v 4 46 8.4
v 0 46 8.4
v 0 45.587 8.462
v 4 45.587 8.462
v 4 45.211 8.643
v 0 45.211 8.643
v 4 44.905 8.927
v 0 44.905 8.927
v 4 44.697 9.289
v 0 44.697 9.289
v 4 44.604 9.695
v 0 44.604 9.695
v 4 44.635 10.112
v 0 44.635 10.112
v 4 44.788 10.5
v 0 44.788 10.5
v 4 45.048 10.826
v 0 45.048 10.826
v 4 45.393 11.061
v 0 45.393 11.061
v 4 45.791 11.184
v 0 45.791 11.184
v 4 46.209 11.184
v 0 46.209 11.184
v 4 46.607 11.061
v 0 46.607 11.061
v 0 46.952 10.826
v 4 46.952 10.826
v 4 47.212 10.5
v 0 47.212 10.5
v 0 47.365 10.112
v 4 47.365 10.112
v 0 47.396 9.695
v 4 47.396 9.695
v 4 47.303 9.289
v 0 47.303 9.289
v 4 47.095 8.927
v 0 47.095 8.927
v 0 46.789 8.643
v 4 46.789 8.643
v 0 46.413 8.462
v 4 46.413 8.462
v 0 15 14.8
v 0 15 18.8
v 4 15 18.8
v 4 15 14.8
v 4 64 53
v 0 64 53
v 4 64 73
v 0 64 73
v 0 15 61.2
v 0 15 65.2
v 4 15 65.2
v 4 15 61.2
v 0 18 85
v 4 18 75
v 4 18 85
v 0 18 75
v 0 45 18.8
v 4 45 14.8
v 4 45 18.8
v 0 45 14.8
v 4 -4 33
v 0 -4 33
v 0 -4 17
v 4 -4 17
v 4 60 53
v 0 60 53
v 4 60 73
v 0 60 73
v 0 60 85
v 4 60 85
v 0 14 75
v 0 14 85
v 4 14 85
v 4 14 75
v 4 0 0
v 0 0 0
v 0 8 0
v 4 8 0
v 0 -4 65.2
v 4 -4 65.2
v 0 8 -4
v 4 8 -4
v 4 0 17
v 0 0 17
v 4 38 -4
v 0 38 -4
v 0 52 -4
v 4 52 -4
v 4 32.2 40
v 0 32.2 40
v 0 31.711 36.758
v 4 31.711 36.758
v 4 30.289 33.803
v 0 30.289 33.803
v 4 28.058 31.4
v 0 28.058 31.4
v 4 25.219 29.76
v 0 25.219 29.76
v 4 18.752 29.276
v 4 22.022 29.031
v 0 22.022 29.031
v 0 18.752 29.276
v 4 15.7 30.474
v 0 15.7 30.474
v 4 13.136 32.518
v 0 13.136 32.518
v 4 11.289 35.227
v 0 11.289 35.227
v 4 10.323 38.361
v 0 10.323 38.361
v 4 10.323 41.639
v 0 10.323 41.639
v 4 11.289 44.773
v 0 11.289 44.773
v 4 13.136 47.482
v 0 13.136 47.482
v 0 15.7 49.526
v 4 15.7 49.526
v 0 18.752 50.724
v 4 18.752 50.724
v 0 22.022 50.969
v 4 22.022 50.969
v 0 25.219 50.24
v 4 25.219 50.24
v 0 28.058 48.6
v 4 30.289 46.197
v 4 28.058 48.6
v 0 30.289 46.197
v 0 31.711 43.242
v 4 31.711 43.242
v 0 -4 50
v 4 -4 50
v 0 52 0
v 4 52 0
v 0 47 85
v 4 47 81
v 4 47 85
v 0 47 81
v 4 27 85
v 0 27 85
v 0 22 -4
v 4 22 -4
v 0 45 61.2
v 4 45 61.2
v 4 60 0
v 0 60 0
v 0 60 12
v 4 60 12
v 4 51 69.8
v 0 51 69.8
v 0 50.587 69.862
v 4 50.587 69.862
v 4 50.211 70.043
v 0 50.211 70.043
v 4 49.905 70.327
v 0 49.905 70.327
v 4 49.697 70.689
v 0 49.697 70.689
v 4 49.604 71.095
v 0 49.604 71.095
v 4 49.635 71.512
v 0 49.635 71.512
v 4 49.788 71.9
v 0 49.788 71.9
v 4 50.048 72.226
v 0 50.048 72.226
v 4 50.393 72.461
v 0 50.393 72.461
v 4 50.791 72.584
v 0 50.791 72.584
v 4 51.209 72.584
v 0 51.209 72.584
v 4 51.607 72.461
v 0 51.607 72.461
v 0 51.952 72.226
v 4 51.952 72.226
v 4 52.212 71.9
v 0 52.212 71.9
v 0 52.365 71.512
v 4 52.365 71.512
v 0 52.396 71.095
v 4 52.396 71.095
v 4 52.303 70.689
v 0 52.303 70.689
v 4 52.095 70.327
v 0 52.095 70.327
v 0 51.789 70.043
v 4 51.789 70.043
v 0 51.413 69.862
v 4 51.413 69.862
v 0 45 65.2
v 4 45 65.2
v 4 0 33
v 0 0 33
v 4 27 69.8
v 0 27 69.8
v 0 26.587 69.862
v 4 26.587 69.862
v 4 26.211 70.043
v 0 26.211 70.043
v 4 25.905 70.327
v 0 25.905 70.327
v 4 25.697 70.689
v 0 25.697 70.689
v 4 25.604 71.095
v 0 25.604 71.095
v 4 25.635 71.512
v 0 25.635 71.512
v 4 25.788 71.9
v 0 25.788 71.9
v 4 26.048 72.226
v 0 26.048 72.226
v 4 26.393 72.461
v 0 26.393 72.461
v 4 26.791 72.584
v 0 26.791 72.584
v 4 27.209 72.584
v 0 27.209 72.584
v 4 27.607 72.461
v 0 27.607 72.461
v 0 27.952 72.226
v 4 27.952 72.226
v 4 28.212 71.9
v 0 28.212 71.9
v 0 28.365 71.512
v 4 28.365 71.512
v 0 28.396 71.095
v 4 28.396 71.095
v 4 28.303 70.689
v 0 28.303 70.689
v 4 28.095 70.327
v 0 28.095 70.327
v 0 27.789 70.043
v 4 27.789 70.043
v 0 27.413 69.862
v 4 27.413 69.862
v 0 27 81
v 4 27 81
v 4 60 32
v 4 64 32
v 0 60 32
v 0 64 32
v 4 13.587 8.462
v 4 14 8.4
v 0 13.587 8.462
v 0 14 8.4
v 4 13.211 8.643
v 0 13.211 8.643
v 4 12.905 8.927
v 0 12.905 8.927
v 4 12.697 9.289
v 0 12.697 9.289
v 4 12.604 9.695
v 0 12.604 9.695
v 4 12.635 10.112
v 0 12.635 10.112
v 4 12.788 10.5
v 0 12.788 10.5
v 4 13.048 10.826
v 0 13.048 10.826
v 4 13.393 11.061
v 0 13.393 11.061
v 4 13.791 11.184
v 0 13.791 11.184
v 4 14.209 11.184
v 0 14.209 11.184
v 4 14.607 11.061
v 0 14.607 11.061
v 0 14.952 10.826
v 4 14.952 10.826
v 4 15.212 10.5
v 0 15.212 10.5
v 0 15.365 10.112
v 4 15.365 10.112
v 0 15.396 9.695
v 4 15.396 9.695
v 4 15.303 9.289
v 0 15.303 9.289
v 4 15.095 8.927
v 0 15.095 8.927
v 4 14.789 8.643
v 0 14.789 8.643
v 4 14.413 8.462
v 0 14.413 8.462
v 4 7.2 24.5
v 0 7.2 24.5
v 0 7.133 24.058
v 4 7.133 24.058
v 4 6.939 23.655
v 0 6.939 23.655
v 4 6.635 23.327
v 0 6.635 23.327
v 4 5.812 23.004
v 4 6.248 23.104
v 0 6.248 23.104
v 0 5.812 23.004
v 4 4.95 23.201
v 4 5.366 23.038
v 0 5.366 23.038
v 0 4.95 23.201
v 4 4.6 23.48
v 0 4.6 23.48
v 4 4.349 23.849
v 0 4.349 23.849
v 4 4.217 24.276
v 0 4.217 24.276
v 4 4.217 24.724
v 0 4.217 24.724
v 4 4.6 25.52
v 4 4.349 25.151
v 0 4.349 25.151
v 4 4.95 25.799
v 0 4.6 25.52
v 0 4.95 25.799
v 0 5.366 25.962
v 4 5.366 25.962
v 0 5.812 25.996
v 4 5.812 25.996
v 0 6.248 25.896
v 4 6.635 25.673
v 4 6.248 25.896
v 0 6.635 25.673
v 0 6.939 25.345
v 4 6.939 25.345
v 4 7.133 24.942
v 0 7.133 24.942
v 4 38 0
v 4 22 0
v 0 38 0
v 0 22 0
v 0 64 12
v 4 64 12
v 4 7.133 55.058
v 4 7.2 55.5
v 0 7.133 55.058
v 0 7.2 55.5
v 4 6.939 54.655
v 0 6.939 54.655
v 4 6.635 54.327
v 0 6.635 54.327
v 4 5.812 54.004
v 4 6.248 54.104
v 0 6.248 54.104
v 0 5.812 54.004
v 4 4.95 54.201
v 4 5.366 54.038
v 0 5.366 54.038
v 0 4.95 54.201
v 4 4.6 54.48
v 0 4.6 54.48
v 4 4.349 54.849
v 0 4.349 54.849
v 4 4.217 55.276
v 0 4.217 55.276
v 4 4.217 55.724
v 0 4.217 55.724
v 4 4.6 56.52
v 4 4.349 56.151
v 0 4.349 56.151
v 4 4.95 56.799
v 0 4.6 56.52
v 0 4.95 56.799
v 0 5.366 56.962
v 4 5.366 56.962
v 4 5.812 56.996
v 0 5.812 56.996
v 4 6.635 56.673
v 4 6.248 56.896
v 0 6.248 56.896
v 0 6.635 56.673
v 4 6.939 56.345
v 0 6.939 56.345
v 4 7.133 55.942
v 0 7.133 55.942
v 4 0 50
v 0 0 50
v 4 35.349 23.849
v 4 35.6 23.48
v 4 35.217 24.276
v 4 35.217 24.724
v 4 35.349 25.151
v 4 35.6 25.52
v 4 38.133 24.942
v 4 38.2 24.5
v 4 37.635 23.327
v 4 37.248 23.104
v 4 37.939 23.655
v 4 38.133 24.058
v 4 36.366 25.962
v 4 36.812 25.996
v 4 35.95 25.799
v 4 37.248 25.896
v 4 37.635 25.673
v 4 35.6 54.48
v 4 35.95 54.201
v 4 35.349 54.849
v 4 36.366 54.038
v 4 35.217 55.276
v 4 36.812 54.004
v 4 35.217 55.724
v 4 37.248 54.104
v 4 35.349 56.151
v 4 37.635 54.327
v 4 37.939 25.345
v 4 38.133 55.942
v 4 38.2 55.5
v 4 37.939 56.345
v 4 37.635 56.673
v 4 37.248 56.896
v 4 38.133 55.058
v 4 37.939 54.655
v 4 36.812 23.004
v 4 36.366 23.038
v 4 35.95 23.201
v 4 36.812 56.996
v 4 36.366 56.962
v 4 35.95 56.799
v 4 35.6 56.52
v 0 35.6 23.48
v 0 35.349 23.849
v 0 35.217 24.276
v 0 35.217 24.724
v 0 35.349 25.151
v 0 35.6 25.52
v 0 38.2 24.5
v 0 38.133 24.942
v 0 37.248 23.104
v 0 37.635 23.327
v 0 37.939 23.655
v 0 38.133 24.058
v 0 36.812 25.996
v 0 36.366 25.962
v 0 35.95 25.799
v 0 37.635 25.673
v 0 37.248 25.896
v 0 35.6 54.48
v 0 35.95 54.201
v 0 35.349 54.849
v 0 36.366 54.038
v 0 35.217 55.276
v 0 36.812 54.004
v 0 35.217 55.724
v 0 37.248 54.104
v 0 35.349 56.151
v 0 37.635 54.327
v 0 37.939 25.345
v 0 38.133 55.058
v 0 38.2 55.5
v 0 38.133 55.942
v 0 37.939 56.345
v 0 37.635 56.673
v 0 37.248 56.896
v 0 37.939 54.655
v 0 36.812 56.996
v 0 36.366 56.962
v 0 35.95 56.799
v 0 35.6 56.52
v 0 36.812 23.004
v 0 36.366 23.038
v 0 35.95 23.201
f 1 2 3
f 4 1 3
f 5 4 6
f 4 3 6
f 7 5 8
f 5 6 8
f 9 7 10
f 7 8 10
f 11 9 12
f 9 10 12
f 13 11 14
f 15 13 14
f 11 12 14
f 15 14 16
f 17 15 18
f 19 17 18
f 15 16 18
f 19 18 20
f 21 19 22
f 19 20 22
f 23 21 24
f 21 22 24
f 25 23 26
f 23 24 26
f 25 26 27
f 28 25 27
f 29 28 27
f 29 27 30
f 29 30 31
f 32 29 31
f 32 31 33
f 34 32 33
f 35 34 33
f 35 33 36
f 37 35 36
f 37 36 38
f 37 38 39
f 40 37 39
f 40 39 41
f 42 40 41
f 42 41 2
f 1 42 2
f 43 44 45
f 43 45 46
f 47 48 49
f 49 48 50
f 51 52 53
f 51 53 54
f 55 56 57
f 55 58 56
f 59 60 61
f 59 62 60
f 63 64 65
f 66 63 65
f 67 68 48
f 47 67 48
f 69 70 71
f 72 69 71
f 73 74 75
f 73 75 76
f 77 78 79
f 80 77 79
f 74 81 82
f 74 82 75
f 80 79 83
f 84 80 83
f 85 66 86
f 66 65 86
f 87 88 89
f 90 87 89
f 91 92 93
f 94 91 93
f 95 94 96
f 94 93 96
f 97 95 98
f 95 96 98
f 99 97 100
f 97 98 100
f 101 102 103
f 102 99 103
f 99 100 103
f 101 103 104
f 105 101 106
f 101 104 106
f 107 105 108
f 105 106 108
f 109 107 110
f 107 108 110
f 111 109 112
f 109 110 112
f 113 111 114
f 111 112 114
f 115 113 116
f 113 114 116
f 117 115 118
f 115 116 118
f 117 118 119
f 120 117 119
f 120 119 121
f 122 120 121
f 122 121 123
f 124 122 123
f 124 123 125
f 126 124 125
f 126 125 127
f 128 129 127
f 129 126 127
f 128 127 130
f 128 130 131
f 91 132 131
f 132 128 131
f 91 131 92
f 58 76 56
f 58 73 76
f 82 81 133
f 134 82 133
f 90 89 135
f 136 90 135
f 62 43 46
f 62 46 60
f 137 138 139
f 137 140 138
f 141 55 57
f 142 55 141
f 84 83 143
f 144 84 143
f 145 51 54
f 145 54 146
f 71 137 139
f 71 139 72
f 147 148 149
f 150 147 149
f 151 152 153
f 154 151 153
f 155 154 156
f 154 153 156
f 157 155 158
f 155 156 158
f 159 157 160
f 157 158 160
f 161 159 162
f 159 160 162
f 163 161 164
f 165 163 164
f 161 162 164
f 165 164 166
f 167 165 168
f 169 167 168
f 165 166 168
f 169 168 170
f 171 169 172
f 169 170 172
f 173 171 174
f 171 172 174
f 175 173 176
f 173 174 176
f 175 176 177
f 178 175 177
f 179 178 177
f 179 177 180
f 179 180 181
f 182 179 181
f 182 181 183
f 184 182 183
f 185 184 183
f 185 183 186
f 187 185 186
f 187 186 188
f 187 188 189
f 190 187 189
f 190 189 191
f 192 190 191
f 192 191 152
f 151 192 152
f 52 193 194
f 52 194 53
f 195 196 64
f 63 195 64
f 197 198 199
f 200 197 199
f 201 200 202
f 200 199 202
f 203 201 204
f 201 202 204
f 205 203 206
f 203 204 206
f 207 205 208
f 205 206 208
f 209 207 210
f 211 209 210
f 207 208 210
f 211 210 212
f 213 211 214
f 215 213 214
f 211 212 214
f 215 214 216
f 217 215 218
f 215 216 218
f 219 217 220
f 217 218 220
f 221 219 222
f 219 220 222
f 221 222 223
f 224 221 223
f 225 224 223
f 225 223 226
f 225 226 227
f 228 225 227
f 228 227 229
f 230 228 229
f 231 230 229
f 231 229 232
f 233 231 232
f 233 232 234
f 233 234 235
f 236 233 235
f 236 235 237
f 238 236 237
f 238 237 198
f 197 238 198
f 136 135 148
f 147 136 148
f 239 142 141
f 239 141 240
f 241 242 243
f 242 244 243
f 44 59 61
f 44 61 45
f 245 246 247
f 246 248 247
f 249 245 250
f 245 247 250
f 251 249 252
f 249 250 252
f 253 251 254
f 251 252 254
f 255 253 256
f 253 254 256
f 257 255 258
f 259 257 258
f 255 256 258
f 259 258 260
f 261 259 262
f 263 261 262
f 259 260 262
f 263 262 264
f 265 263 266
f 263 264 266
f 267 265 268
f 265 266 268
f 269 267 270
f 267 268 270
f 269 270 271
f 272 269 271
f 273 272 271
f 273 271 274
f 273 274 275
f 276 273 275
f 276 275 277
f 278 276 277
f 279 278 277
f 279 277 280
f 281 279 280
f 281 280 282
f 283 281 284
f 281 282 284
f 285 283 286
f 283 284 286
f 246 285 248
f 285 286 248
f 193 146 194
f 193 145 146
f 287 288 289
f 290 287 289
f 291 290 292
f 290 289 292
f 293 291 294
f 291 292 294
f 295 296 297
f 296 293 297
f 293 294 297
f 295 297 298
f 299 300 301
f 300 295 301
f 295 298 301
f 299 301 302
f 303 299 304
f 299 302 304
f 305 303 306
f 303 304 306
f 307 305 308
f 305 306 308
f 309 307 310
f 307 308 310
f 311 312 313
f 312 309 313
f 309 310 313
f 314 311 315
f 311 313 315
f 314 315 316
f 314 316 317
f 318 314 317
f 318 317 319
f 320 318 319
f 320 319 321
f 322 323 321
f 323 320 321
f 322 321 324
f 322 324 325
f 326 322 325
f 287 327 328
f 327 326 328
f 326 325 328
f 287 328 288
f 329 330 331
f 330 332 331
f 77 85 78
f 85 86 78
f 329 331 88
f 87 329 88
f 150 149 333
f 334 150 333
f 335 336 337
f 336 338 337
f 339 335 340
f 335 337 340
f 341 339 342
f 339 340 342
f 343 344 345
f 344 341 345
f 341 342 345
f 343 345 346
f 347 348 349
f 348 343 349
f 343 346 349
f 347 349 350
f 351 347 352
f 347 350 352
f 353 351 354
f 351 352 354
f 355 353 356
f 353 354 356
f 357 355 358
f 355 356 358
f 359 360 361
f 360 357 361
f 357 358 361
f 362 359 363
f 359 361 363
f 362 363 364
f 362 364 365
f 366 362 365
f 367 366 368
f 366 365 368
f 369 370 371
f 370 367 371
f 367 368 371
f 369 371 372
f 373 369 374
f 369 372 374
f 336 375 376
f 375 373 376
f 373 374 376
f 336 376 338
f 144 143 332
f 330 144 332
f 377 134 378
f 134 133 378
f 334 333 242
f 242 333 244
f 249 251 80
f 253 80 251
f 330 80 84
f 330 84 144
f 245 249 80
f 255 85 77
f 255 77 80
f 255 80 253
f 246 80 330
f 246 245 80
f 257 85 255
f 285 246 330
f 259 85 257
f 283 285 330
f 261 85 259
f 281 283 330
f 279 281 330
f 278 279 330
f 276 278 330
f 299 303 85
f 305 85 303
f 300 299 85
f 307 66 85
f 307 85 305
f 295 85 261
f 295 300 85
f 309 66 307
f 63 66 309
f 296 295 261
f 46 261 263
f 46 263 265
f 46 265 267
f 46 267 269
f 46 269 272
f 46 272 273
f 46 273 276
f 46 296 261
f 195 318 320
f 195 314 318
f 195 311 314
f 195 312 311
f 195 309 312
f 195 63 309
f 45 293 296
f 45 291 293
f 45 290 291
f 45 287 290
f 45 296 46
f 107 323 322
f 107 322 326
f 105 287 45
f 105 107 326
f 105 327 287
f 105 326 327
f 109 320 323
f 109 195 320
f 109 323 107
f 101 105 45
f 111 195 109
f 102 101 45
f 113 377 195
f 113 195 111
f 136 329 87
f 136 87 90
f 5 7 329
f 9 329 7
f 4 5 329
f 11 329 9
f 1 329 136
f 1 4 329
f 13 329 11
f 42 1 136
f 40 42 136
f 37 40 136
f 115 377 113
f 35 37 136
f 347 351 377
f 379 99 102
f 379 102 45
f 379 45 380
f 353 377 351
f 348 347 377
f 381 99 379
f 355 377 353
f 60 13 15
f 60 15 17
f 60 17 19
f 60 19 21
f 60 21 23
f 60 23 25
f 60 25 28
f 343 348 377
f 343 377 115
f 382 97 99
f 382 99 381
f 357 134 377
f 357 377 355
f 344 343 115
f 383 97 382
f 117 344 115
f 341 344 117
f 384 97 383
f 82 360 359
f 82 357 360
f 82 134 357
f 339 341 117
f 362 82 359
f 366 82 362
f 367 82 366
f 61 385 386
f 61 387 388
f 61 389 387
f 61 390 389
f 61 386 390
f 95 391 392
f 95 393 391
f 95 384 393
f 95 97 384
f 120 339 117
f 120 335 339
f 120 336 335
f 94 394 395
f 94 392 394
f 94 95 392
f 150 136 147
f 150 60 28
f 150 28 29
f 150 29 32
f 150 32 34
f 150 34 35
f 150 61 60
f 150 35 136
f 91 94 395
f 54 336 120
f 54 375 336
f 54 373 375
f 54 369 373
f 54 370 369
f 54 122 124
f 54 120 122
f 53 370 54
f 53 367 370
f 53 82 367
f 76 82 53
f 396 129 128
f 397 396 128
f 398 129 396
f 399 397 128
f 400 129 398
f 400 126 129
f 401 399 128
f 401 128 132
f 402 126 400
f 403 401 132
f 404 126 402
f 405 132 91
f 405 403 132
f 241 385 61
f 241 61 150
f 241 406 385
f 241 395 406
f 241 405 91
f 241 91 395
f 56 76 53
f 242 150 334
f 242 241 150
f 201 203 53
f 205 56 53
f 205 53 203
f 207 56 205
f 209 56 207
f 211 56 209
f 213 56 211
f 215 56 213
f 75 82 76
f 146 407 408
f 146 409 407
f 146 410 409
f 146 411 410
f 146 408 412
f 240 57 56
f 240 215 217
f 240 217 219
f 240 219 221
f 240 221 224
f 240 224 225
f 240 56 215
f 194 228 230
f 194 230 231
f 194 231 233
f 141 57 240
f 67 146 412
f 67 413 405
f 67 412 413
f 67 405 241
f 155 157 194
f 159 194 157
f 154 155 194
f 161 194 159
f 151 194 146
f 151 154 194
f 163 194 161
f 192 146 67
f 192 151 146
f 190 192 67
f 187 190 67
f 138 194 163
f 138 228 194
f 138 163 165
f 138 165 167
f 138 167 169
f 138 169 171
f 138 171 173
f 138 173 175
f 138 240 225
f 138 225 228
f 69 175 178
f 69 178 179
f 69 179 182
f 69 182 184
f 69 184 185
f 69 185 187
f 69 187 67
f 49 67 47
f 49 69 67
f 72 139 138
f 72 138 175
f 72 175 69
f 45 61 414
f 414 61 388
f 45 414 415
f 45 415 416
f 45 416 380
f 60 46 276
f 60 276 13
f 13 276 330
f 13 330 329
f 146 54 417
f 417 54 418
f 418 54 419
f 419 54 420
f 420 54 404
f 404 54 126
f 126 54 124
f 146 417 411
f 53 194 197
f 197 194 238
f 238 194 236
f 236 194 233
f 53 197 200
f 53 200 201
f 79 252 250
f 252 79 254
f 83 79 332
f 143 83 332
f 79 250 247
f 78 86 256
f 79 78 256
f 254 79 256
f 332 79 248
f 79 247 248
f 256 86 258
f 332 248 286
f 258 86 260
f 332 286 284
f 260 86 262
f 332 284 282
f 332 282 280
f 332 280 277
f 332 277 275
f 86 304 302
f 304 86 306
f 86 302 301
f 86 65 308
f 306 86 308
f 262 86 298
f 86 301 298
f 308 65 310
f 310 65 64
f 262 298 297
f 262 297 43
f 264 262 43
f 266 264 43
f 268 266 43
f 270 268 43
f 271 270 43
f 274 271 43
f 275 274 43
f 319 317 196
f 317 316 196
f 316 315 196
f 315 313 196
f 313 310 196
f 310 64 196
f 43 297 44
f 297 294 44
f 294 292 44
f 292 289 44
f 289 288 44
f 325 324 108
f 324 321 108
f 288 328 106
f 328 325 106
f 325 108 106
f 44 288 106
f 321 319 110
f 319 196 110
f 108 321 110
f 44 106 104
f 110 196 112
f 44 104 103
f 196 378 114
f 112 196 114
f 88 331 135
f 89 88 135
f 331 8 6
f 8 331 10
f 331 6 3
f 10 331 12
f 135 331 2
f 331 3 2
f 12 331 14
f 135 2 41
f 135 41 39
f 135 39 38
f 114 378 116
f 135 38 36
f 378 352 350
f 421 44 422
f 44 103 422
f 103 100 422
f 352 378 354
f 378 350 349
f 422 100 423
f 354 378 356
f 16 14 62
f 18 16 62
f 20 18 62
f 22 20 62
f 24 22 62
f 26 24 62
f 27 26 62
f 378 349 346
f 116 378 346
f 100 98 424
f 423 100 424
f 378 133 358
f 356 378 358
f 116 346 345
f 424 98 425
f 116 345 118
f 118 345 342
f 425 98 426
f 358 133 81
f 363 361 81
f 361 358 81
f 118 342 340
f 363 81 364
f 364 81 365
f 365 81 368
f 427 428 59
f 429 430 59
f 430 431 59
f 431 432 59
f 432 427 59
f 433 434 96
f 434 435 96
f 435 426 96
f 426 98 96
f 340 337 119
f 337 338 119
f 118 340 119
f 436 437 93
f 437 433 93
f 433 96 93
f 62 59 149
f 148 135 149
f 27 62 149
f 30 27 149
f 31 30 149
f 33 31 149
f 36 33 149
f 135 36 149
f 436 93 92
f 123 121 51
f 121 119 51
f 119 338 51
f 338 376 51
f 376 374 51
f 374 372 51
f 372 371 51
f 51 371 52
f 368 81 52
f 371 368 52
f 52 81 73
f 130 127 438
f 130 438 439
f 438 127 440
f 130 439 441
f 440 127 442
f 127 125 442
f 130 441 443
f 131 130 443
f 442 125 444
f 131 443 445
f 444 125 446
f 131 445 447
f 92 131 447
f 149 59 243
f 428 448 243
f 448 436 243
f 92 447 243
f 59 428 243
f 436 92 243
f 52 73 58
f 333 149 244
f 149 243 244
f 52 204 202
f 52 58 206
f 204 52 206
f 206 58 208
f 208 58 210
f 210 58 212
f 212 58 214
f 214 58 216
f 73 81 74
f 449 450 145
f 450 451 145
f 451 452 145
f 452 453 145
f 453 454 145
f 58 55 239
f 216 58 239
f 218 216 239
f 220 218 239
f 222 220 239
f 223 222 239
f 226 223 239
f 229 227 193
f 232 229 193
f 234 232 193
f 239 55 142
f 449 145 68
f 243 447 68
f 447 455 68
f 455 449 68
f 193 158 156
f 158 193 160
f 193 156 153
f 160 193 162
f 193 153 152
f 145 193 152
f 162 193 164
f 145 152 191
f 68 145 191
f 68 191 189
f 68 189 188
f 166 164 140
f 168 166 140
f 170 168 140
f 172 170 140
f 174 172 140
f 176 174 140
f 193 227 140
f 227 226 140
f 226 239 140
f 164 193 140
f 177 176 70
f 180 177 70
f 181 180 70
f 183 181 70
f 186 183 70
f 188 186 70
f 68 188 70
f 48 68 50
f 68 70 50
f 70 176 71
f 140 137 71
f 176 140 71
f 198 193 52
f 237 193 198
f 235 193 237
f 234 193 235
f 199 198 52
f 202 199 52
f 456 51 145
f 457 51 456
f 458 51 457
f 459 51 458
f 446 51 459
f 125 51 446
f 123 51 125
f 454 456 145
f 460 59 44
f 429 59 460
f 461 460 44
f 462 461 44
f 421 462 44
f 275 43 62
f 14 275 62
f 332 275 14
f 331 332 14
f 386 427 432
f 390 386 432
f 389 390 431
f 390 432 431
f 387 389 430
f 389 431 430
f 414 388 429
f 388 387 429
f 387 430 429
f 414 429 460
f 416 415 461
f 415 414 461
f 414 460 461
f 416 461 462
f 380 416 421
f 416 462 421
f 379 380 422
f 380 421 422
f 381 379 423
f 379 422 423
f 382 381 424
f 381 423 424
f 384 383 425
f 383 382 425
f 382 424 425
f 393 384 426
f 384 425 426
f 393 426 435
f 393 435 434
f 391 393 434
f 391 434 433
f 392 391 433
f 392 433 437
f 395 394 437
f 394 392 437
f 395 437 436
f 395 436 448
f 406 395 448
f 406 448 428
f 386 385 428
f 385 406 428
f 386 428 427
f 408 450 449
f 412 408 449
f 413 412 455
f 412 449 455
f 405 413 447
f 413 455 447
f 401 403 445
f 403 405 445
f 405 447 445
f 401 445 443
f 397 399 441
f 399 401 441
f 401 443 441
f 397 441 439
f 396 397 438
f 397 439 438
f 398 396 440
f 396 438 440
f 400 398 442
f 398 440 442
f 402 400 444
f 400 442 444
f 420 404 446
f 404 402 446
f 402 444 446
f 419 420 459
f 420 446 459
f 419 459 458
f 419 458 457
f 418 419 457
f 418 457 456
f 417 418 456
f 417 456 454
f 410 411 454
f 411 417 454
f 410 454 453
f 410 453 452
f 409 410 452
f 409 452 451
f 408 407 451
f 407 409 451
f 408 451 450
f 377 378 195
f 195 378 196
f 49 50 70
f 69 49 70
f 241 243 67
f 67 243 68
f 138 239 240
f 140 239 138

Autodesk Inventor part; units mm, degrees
ref_plane "YZ Plane" through (0, 0, 0) normal (1, 0, 0) x (0, 1, 0)
ref_plane "XZ Plane" through (0, 0, 0) normal (0, 1, 0) x (-1, 0, 0)
ref_plane "XY Plane" through (0, 0, 0) normal (0, 0, 1) x (1, 0, 0)
sketch "Эскиз1" plane through (0, 0, 0) normal (1, 0, 0) x (0, 1, 0)
  line L0 (0, 0) -> (8, 0)
  line L1 (8, 0) -> (8, -4)
  line L2 (8, -4) -> (22, -4)
  line L3 (22, -4) -> (22, 0)
  line L4 (22, 0) -> (38, 0)
  line L5 (38, 0) -> (38, -4)
  line L6 (38, -4) -> (52, -4)
  line L7 (52, -4) -> (52, 0)
  line L8 (52, 0) -> (60, 0)
  line L9 (60, 0) -> (60, 12)
  line L10 (60, 12) -> (64, 12)
  line L11 (64, 12) -> (64, 32)
  line L12 (64, 32) -> (60, 32)
  line L13 (60, 32) -> (60, 53)
  line L14 (60, 53) -> (64, 53)
  line L15 (64, 53) -> (64, 73)
  line L16 (64, 73) -> (60, 73)
  line L17 (60, 73) -> (60, 85)
  line L18 (-4, 65.2) -> (-4, 50)
  line L19 (-4, 50) -> (0, 50)
  line L20 (0, 50) -> (0, 33)
  line L21 (0, 33) -> (-4, 33)
  line L22 (-4, 33) -> (-4, 17)
  line L23 (-4, 17) -> (0, 17)
  line L24 (0, 17) -> (0, 0)
  line L25 (0, 61.2) -> (42.4, 61.2) construction
  line L26 (42.4, 61.2) -> (42.4, 18.8) construction
  line L27 (42.4, 18.8) -> (0, 18.8) construction
  line L28 (0, 18.8) -> (0, 61.2) construction
  line L29 (42.4, 61.2) -> (0, 18.8) construction
  line L30 (0, 61.2) -> (42.4, 18.8) construction
  circle A0 centre (21.2, 40) radius 11
  circle A1 centre (36.7, 55.5) radius 1.5
  circle A2 centre (36.7, 24.5) radius 1.5
  circle A3 centre (5.7, 24.5) radius 1.5
  circle A4 centre (5.7, 55.5) radius 1.5
  line L31 (-4, 65.2) -> (14, 85)
  line L32 (27, 85) -> (27, 81)
  line L33 (27, 81) -> (47, 81)
  line L34 (47, 81) -> (47, 85)
  line L35 (47, 85) -> (60, 85)
  line L36 (15, 14.8) -> (45, 14.8)
  line L37 (45, 14.8) -> (45, 18.8)
  line L38 (45, 18.8) -> (15, 18.8)
  line L39 (15, 18.8) -> (15, 14.8)
  line L40 (15, 61.2) -> (45, 61.2)
  line L41 (45, 61.2) -> (45, 65.2)
  line L42 (45, 65.2) -> (15, 65.2)
  line L43 (15, 65.2) -> (15, 61.2)
  line L44 (14, 85) -> (14, 75)
  line L45 (14, 75) -> (18, 75)
  line L46 (18, 75) -> (18, 85)
  line L47 (18, 85) -> (27, 85)
  point P0 (21.2, 40)
  point P1 (30, 14.8)
  point P2 (30, 0)
  dimension "d0" = 4
  dimension "d1" = 8
  dimension "d2" = 14
  dimension "d3" = 16
  dimension "d4" = 14
  dimension "d5" = 8
  dimension "d6" = 17
  dimension "d7" = 16
  dimension "d8" = 17
  dimension "d9" = 15.2
  dimension "d11" = 12
  dimension "d12" = 20
  dimension "d13" = 20
  dimension "d16" = 21
  dimension "d22" = 42.4
  dimension "d23" = 31
  dimension "d24" = 40
  dimension "d25" = 22
  dimension "d26" = 3
  dimension "d31" = 85
  dimension "d32" = 12
  dimension "d33" = 20
  dimension "d36" = 30
  dimension "d37" = 10
  dimension "d38" = 13
  dimension "d40" = 13
extrude "Выдавливание1" add sketch "Эскиз1" along normal blind 4
sketch "Эскиз4" plane through (4, 0, 0) normal (1, 0, 0) x (0, 0, -1)
  line L0 (0, 0) -> (0, 8) projected
  line L1 (-14.8, 45) -> (-14.8, 15) projected
  line L2 (-17, 0) -> (0, 0) projected
  line L3 (0, 60) -> (-12, 60) projected
  line L4 (-73, 60) -> (-85, 60) projected
  line L5 (-65.2, 15) -> (-65.2, 45) projected
  point P0 (-9.8, 14)
  point P1 (-9.8, 46)
  point P2 (-71.2, 51)
  point P3 (-71.2, 27)
  dimension "d51" = 5
  dimension "d52" = 14
  dimension "d53" = 14
  dimension "d54" = 9
  dimension "d55" = 33
  dimension "d56" = 6
hole "Отверстие1" at (4, 14, 9.8) at (4, 46, 9.8) at (4, 51, 71.2) at (4, 27, 71.2) direction (-1, 0, 0) diameter 2.8 end through all
properties part number "stepperMount" material "Дерево (береза)"
